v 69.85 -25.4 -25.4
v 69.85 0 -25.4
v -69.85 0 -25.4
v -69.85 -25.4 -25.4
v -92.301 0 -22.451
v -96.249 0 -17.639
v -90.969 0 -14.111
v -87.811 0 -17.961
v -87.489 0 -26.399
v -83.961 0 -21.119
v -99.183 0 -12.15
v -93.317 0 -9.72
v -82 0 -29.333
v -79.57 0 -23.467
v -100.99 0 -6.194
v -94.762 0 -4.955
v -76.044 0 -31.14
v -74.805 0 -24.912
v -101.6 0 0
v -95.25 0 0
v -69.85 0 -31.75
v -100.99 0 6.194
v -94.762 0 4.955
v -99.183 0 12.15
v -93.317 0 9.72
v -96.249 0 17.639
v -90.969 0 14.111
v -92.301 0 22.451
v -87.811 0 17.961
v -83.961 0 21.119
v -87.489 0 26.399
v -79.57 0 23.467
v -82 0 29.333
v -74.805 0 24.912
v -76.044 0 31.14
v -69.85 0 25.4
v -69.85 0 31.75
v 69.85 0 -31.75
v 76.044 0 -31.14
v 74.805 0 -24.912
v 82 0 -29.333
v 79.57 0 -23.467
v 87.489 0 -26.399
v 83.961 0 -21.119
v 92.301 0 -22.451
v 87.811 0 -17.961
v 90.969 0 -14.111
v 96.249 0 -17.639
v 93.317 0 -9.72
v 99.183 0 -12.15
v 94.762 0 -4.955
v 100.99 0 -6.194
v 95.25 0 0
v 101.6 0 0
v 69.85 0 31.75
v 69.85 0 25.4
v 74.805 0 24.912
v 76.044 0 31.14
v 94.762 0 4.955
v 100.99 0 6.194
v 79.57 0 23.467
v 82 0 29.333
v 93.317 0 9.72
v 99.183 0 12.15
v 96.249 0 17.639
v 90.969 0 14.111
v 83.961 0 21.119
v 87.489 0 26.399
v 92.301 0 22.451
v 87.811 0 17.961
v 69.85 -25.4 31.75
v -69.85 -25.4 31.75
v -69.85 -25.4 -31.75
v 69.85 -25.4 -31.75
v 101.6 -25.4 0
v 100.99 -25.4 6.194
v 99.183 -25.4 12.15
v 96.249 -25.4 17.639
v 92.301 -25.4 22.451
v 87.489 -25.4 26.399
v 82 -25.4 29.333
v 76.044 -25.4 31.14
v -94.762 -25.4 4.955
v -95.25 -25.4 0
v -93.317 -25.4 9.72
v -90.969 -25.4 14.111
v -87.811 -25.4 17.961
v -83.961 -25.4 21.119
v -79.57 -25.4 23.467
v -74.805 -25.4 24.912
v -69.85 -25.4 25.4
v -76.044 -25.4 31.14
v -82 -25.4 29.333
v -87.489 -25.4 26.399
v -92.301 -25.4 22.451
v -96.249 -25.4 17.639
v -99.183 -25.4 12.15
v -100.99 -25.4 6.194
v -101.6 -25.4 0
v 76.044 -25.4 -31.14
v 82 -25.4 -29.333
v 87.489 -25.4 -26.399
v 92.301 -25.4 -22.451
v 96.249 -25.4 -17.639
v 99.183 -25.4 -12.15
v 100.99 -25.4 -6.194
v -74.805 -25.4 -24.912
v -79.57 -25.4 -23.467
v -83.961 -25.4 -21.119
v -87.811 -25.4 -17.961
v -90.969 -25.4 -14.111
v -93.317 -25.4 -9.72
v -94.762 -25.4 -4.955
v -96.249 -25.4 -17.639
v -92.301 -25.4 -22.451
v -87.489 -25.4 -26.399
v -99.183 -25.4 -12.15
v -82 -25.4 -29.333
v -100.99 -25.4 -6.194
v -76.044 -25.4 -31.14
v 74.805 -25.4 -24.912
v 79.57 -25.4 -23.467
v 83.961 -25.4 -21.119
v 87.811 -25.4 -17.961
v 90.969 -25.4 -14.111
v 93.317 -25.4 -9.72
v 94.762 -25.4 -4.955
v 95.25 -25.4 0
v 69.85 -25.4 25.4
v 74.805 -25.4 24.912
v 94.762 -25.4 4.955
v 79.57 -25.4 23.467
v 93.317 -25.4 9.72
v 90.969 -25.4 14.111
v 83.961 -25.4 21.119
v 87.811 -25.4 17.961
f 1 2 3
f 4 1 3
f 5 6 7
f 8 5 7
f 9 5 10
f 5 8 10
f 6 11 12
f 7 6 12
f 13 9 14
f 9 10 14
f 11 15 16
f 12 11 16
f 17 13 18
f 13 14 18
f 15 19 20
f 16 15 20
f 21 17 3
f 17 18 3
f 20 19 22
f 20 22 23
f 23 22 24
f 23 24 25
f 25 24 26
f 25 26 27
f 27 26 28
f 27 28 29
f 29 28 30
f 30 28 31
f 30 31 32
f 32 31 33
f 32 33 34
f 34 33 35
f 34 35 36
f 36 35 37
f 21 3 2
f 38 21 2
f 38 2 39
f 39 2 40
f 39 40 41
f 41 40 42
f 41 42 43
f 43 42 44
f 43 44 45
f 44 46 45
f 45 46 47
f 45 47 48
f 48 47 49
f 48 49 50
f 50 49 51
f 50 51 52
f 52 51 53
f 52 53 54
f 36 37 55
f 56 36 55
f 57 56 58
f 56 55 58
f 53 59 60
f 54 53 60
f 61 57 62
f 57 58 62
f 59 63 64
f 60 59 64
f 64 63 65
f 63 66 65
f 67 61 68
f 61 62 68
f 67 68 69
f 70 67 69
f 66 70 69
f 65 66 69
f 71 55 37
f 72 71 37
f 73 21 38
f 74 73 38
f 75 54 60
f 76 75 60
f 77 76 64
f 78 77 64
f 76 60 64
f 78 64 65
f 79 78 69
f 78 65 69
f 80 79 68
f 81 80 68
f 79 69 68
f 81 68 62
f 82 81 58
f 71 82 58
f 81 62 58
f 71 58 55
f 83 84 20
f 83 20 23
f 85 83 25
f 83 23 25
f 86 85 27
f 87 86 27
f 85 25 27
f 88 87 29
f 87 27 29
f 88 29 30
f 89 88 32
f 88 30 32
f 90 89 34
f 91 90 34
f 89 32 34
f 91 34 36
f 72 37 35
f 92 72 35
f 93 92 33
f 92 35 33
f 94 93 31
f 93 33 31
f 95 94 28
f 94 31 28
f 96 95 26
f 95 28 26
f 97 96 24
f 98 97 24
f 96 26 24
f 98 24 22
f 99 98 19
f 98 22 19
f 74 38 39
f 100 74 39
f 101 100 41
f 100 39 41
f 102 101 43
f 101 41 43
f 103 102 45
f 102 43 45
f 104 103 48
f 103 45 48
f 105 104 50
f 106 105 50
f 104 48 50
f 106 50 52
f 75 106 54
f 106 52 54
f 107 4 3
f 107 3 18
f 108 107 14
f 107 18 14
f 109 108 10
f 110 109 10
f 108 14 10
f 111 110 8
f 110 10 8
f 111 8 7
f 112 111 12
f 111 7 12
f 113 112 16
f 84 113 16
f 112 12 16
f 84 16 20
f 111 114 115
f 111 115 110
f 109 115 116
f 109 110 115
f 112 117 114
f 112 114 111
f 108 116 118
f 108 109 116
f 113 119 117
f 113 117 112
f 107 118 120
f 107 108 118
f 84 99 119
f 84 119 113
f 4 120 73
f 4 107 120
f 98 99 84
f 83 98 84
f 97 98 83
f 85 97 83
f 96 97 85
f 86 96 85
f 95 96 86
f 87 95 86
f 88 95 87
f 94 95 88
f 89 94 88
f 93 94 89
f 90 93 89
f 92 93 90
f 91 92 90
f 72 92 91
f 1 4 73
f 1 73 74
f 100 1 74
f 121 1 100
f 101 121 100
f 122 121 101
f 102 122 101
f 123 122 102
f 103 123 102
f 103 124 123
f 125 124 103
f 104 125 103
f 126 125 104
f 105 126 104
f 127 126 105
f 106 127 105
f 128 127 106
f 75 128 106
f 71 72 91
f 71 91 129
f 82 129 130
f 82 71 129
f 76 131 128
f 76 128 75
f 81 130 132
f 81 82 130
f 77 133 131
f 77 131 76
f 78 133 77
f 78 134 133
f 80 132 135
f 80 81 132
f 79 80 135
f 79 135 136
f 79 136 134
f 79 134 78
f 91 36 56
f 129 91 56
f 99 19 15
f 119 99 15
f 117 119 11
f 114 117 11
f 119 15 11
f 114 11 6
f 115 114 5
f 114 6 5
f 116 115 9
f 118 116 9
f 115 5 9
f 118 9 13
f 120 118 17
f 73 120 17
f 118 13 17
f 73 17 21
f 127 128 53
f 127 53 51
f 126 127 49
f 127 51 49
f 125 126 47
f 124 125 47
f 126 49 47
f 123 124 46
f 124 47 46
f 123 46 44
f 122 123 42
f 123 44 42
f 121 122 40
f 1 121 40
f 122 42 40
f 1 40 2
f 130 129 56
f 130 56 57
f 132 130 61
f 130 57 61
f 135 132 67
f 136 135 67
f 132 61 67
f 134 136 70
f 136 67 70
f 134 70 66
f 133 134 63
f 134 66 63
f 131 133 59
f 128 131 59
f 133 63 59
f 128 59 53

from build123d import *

# Parameters (mm, degrees)
F1_DEPTH = 25.4


with BuildPart() as f1:
    # F0 (on Front) → F1 (new body)
    with BuildSketch(Plane.XZ):
        with BuildLine():
            Line((69.85, 31.75), (-69.85, 31.75))
            ThreePointArc((-69.85, 31.75), (-92.30064, 22.45064), (-101.6, 0))
            ThreePointArc((-101.6, 0), (-92.30064, -22.45064), (-69.85, -31.75))
            Line((-69.85, -31.75), (69.85, -31.75))
            ThreePointArc((69.85, -31.75), (92.30064, -22.45064), (101.6, 0))
            ThreePointArc((101.6, 0), (92.30064, 22.45064), (69.85, 31.75))
        make_face()
        with BuildLine():
            Line((-69.85, 25.4), (69.85, 25.4))
            ThreePointArc((69.85, 25.4), (87.810512, 17.960512), (95.25, 0))
            ThreePointArc((95.25, 0), (87.810512, -17.960512), (69.85, -25.4))
            Line((69.85, -25.4), (-69.85, -25.4))
            ThreePointArc((-69.85, -25.4), (-87.810512, -17.960512), (-95.25, 0))
            ThreePointArc((-95.25, 0), (-87.810512, 17.960512), (-69.85, 25.4))
        make_face(mode=Mode.SUBTRACT)
    extrude(amount=F1_DEPTH)


solid = f1.part
